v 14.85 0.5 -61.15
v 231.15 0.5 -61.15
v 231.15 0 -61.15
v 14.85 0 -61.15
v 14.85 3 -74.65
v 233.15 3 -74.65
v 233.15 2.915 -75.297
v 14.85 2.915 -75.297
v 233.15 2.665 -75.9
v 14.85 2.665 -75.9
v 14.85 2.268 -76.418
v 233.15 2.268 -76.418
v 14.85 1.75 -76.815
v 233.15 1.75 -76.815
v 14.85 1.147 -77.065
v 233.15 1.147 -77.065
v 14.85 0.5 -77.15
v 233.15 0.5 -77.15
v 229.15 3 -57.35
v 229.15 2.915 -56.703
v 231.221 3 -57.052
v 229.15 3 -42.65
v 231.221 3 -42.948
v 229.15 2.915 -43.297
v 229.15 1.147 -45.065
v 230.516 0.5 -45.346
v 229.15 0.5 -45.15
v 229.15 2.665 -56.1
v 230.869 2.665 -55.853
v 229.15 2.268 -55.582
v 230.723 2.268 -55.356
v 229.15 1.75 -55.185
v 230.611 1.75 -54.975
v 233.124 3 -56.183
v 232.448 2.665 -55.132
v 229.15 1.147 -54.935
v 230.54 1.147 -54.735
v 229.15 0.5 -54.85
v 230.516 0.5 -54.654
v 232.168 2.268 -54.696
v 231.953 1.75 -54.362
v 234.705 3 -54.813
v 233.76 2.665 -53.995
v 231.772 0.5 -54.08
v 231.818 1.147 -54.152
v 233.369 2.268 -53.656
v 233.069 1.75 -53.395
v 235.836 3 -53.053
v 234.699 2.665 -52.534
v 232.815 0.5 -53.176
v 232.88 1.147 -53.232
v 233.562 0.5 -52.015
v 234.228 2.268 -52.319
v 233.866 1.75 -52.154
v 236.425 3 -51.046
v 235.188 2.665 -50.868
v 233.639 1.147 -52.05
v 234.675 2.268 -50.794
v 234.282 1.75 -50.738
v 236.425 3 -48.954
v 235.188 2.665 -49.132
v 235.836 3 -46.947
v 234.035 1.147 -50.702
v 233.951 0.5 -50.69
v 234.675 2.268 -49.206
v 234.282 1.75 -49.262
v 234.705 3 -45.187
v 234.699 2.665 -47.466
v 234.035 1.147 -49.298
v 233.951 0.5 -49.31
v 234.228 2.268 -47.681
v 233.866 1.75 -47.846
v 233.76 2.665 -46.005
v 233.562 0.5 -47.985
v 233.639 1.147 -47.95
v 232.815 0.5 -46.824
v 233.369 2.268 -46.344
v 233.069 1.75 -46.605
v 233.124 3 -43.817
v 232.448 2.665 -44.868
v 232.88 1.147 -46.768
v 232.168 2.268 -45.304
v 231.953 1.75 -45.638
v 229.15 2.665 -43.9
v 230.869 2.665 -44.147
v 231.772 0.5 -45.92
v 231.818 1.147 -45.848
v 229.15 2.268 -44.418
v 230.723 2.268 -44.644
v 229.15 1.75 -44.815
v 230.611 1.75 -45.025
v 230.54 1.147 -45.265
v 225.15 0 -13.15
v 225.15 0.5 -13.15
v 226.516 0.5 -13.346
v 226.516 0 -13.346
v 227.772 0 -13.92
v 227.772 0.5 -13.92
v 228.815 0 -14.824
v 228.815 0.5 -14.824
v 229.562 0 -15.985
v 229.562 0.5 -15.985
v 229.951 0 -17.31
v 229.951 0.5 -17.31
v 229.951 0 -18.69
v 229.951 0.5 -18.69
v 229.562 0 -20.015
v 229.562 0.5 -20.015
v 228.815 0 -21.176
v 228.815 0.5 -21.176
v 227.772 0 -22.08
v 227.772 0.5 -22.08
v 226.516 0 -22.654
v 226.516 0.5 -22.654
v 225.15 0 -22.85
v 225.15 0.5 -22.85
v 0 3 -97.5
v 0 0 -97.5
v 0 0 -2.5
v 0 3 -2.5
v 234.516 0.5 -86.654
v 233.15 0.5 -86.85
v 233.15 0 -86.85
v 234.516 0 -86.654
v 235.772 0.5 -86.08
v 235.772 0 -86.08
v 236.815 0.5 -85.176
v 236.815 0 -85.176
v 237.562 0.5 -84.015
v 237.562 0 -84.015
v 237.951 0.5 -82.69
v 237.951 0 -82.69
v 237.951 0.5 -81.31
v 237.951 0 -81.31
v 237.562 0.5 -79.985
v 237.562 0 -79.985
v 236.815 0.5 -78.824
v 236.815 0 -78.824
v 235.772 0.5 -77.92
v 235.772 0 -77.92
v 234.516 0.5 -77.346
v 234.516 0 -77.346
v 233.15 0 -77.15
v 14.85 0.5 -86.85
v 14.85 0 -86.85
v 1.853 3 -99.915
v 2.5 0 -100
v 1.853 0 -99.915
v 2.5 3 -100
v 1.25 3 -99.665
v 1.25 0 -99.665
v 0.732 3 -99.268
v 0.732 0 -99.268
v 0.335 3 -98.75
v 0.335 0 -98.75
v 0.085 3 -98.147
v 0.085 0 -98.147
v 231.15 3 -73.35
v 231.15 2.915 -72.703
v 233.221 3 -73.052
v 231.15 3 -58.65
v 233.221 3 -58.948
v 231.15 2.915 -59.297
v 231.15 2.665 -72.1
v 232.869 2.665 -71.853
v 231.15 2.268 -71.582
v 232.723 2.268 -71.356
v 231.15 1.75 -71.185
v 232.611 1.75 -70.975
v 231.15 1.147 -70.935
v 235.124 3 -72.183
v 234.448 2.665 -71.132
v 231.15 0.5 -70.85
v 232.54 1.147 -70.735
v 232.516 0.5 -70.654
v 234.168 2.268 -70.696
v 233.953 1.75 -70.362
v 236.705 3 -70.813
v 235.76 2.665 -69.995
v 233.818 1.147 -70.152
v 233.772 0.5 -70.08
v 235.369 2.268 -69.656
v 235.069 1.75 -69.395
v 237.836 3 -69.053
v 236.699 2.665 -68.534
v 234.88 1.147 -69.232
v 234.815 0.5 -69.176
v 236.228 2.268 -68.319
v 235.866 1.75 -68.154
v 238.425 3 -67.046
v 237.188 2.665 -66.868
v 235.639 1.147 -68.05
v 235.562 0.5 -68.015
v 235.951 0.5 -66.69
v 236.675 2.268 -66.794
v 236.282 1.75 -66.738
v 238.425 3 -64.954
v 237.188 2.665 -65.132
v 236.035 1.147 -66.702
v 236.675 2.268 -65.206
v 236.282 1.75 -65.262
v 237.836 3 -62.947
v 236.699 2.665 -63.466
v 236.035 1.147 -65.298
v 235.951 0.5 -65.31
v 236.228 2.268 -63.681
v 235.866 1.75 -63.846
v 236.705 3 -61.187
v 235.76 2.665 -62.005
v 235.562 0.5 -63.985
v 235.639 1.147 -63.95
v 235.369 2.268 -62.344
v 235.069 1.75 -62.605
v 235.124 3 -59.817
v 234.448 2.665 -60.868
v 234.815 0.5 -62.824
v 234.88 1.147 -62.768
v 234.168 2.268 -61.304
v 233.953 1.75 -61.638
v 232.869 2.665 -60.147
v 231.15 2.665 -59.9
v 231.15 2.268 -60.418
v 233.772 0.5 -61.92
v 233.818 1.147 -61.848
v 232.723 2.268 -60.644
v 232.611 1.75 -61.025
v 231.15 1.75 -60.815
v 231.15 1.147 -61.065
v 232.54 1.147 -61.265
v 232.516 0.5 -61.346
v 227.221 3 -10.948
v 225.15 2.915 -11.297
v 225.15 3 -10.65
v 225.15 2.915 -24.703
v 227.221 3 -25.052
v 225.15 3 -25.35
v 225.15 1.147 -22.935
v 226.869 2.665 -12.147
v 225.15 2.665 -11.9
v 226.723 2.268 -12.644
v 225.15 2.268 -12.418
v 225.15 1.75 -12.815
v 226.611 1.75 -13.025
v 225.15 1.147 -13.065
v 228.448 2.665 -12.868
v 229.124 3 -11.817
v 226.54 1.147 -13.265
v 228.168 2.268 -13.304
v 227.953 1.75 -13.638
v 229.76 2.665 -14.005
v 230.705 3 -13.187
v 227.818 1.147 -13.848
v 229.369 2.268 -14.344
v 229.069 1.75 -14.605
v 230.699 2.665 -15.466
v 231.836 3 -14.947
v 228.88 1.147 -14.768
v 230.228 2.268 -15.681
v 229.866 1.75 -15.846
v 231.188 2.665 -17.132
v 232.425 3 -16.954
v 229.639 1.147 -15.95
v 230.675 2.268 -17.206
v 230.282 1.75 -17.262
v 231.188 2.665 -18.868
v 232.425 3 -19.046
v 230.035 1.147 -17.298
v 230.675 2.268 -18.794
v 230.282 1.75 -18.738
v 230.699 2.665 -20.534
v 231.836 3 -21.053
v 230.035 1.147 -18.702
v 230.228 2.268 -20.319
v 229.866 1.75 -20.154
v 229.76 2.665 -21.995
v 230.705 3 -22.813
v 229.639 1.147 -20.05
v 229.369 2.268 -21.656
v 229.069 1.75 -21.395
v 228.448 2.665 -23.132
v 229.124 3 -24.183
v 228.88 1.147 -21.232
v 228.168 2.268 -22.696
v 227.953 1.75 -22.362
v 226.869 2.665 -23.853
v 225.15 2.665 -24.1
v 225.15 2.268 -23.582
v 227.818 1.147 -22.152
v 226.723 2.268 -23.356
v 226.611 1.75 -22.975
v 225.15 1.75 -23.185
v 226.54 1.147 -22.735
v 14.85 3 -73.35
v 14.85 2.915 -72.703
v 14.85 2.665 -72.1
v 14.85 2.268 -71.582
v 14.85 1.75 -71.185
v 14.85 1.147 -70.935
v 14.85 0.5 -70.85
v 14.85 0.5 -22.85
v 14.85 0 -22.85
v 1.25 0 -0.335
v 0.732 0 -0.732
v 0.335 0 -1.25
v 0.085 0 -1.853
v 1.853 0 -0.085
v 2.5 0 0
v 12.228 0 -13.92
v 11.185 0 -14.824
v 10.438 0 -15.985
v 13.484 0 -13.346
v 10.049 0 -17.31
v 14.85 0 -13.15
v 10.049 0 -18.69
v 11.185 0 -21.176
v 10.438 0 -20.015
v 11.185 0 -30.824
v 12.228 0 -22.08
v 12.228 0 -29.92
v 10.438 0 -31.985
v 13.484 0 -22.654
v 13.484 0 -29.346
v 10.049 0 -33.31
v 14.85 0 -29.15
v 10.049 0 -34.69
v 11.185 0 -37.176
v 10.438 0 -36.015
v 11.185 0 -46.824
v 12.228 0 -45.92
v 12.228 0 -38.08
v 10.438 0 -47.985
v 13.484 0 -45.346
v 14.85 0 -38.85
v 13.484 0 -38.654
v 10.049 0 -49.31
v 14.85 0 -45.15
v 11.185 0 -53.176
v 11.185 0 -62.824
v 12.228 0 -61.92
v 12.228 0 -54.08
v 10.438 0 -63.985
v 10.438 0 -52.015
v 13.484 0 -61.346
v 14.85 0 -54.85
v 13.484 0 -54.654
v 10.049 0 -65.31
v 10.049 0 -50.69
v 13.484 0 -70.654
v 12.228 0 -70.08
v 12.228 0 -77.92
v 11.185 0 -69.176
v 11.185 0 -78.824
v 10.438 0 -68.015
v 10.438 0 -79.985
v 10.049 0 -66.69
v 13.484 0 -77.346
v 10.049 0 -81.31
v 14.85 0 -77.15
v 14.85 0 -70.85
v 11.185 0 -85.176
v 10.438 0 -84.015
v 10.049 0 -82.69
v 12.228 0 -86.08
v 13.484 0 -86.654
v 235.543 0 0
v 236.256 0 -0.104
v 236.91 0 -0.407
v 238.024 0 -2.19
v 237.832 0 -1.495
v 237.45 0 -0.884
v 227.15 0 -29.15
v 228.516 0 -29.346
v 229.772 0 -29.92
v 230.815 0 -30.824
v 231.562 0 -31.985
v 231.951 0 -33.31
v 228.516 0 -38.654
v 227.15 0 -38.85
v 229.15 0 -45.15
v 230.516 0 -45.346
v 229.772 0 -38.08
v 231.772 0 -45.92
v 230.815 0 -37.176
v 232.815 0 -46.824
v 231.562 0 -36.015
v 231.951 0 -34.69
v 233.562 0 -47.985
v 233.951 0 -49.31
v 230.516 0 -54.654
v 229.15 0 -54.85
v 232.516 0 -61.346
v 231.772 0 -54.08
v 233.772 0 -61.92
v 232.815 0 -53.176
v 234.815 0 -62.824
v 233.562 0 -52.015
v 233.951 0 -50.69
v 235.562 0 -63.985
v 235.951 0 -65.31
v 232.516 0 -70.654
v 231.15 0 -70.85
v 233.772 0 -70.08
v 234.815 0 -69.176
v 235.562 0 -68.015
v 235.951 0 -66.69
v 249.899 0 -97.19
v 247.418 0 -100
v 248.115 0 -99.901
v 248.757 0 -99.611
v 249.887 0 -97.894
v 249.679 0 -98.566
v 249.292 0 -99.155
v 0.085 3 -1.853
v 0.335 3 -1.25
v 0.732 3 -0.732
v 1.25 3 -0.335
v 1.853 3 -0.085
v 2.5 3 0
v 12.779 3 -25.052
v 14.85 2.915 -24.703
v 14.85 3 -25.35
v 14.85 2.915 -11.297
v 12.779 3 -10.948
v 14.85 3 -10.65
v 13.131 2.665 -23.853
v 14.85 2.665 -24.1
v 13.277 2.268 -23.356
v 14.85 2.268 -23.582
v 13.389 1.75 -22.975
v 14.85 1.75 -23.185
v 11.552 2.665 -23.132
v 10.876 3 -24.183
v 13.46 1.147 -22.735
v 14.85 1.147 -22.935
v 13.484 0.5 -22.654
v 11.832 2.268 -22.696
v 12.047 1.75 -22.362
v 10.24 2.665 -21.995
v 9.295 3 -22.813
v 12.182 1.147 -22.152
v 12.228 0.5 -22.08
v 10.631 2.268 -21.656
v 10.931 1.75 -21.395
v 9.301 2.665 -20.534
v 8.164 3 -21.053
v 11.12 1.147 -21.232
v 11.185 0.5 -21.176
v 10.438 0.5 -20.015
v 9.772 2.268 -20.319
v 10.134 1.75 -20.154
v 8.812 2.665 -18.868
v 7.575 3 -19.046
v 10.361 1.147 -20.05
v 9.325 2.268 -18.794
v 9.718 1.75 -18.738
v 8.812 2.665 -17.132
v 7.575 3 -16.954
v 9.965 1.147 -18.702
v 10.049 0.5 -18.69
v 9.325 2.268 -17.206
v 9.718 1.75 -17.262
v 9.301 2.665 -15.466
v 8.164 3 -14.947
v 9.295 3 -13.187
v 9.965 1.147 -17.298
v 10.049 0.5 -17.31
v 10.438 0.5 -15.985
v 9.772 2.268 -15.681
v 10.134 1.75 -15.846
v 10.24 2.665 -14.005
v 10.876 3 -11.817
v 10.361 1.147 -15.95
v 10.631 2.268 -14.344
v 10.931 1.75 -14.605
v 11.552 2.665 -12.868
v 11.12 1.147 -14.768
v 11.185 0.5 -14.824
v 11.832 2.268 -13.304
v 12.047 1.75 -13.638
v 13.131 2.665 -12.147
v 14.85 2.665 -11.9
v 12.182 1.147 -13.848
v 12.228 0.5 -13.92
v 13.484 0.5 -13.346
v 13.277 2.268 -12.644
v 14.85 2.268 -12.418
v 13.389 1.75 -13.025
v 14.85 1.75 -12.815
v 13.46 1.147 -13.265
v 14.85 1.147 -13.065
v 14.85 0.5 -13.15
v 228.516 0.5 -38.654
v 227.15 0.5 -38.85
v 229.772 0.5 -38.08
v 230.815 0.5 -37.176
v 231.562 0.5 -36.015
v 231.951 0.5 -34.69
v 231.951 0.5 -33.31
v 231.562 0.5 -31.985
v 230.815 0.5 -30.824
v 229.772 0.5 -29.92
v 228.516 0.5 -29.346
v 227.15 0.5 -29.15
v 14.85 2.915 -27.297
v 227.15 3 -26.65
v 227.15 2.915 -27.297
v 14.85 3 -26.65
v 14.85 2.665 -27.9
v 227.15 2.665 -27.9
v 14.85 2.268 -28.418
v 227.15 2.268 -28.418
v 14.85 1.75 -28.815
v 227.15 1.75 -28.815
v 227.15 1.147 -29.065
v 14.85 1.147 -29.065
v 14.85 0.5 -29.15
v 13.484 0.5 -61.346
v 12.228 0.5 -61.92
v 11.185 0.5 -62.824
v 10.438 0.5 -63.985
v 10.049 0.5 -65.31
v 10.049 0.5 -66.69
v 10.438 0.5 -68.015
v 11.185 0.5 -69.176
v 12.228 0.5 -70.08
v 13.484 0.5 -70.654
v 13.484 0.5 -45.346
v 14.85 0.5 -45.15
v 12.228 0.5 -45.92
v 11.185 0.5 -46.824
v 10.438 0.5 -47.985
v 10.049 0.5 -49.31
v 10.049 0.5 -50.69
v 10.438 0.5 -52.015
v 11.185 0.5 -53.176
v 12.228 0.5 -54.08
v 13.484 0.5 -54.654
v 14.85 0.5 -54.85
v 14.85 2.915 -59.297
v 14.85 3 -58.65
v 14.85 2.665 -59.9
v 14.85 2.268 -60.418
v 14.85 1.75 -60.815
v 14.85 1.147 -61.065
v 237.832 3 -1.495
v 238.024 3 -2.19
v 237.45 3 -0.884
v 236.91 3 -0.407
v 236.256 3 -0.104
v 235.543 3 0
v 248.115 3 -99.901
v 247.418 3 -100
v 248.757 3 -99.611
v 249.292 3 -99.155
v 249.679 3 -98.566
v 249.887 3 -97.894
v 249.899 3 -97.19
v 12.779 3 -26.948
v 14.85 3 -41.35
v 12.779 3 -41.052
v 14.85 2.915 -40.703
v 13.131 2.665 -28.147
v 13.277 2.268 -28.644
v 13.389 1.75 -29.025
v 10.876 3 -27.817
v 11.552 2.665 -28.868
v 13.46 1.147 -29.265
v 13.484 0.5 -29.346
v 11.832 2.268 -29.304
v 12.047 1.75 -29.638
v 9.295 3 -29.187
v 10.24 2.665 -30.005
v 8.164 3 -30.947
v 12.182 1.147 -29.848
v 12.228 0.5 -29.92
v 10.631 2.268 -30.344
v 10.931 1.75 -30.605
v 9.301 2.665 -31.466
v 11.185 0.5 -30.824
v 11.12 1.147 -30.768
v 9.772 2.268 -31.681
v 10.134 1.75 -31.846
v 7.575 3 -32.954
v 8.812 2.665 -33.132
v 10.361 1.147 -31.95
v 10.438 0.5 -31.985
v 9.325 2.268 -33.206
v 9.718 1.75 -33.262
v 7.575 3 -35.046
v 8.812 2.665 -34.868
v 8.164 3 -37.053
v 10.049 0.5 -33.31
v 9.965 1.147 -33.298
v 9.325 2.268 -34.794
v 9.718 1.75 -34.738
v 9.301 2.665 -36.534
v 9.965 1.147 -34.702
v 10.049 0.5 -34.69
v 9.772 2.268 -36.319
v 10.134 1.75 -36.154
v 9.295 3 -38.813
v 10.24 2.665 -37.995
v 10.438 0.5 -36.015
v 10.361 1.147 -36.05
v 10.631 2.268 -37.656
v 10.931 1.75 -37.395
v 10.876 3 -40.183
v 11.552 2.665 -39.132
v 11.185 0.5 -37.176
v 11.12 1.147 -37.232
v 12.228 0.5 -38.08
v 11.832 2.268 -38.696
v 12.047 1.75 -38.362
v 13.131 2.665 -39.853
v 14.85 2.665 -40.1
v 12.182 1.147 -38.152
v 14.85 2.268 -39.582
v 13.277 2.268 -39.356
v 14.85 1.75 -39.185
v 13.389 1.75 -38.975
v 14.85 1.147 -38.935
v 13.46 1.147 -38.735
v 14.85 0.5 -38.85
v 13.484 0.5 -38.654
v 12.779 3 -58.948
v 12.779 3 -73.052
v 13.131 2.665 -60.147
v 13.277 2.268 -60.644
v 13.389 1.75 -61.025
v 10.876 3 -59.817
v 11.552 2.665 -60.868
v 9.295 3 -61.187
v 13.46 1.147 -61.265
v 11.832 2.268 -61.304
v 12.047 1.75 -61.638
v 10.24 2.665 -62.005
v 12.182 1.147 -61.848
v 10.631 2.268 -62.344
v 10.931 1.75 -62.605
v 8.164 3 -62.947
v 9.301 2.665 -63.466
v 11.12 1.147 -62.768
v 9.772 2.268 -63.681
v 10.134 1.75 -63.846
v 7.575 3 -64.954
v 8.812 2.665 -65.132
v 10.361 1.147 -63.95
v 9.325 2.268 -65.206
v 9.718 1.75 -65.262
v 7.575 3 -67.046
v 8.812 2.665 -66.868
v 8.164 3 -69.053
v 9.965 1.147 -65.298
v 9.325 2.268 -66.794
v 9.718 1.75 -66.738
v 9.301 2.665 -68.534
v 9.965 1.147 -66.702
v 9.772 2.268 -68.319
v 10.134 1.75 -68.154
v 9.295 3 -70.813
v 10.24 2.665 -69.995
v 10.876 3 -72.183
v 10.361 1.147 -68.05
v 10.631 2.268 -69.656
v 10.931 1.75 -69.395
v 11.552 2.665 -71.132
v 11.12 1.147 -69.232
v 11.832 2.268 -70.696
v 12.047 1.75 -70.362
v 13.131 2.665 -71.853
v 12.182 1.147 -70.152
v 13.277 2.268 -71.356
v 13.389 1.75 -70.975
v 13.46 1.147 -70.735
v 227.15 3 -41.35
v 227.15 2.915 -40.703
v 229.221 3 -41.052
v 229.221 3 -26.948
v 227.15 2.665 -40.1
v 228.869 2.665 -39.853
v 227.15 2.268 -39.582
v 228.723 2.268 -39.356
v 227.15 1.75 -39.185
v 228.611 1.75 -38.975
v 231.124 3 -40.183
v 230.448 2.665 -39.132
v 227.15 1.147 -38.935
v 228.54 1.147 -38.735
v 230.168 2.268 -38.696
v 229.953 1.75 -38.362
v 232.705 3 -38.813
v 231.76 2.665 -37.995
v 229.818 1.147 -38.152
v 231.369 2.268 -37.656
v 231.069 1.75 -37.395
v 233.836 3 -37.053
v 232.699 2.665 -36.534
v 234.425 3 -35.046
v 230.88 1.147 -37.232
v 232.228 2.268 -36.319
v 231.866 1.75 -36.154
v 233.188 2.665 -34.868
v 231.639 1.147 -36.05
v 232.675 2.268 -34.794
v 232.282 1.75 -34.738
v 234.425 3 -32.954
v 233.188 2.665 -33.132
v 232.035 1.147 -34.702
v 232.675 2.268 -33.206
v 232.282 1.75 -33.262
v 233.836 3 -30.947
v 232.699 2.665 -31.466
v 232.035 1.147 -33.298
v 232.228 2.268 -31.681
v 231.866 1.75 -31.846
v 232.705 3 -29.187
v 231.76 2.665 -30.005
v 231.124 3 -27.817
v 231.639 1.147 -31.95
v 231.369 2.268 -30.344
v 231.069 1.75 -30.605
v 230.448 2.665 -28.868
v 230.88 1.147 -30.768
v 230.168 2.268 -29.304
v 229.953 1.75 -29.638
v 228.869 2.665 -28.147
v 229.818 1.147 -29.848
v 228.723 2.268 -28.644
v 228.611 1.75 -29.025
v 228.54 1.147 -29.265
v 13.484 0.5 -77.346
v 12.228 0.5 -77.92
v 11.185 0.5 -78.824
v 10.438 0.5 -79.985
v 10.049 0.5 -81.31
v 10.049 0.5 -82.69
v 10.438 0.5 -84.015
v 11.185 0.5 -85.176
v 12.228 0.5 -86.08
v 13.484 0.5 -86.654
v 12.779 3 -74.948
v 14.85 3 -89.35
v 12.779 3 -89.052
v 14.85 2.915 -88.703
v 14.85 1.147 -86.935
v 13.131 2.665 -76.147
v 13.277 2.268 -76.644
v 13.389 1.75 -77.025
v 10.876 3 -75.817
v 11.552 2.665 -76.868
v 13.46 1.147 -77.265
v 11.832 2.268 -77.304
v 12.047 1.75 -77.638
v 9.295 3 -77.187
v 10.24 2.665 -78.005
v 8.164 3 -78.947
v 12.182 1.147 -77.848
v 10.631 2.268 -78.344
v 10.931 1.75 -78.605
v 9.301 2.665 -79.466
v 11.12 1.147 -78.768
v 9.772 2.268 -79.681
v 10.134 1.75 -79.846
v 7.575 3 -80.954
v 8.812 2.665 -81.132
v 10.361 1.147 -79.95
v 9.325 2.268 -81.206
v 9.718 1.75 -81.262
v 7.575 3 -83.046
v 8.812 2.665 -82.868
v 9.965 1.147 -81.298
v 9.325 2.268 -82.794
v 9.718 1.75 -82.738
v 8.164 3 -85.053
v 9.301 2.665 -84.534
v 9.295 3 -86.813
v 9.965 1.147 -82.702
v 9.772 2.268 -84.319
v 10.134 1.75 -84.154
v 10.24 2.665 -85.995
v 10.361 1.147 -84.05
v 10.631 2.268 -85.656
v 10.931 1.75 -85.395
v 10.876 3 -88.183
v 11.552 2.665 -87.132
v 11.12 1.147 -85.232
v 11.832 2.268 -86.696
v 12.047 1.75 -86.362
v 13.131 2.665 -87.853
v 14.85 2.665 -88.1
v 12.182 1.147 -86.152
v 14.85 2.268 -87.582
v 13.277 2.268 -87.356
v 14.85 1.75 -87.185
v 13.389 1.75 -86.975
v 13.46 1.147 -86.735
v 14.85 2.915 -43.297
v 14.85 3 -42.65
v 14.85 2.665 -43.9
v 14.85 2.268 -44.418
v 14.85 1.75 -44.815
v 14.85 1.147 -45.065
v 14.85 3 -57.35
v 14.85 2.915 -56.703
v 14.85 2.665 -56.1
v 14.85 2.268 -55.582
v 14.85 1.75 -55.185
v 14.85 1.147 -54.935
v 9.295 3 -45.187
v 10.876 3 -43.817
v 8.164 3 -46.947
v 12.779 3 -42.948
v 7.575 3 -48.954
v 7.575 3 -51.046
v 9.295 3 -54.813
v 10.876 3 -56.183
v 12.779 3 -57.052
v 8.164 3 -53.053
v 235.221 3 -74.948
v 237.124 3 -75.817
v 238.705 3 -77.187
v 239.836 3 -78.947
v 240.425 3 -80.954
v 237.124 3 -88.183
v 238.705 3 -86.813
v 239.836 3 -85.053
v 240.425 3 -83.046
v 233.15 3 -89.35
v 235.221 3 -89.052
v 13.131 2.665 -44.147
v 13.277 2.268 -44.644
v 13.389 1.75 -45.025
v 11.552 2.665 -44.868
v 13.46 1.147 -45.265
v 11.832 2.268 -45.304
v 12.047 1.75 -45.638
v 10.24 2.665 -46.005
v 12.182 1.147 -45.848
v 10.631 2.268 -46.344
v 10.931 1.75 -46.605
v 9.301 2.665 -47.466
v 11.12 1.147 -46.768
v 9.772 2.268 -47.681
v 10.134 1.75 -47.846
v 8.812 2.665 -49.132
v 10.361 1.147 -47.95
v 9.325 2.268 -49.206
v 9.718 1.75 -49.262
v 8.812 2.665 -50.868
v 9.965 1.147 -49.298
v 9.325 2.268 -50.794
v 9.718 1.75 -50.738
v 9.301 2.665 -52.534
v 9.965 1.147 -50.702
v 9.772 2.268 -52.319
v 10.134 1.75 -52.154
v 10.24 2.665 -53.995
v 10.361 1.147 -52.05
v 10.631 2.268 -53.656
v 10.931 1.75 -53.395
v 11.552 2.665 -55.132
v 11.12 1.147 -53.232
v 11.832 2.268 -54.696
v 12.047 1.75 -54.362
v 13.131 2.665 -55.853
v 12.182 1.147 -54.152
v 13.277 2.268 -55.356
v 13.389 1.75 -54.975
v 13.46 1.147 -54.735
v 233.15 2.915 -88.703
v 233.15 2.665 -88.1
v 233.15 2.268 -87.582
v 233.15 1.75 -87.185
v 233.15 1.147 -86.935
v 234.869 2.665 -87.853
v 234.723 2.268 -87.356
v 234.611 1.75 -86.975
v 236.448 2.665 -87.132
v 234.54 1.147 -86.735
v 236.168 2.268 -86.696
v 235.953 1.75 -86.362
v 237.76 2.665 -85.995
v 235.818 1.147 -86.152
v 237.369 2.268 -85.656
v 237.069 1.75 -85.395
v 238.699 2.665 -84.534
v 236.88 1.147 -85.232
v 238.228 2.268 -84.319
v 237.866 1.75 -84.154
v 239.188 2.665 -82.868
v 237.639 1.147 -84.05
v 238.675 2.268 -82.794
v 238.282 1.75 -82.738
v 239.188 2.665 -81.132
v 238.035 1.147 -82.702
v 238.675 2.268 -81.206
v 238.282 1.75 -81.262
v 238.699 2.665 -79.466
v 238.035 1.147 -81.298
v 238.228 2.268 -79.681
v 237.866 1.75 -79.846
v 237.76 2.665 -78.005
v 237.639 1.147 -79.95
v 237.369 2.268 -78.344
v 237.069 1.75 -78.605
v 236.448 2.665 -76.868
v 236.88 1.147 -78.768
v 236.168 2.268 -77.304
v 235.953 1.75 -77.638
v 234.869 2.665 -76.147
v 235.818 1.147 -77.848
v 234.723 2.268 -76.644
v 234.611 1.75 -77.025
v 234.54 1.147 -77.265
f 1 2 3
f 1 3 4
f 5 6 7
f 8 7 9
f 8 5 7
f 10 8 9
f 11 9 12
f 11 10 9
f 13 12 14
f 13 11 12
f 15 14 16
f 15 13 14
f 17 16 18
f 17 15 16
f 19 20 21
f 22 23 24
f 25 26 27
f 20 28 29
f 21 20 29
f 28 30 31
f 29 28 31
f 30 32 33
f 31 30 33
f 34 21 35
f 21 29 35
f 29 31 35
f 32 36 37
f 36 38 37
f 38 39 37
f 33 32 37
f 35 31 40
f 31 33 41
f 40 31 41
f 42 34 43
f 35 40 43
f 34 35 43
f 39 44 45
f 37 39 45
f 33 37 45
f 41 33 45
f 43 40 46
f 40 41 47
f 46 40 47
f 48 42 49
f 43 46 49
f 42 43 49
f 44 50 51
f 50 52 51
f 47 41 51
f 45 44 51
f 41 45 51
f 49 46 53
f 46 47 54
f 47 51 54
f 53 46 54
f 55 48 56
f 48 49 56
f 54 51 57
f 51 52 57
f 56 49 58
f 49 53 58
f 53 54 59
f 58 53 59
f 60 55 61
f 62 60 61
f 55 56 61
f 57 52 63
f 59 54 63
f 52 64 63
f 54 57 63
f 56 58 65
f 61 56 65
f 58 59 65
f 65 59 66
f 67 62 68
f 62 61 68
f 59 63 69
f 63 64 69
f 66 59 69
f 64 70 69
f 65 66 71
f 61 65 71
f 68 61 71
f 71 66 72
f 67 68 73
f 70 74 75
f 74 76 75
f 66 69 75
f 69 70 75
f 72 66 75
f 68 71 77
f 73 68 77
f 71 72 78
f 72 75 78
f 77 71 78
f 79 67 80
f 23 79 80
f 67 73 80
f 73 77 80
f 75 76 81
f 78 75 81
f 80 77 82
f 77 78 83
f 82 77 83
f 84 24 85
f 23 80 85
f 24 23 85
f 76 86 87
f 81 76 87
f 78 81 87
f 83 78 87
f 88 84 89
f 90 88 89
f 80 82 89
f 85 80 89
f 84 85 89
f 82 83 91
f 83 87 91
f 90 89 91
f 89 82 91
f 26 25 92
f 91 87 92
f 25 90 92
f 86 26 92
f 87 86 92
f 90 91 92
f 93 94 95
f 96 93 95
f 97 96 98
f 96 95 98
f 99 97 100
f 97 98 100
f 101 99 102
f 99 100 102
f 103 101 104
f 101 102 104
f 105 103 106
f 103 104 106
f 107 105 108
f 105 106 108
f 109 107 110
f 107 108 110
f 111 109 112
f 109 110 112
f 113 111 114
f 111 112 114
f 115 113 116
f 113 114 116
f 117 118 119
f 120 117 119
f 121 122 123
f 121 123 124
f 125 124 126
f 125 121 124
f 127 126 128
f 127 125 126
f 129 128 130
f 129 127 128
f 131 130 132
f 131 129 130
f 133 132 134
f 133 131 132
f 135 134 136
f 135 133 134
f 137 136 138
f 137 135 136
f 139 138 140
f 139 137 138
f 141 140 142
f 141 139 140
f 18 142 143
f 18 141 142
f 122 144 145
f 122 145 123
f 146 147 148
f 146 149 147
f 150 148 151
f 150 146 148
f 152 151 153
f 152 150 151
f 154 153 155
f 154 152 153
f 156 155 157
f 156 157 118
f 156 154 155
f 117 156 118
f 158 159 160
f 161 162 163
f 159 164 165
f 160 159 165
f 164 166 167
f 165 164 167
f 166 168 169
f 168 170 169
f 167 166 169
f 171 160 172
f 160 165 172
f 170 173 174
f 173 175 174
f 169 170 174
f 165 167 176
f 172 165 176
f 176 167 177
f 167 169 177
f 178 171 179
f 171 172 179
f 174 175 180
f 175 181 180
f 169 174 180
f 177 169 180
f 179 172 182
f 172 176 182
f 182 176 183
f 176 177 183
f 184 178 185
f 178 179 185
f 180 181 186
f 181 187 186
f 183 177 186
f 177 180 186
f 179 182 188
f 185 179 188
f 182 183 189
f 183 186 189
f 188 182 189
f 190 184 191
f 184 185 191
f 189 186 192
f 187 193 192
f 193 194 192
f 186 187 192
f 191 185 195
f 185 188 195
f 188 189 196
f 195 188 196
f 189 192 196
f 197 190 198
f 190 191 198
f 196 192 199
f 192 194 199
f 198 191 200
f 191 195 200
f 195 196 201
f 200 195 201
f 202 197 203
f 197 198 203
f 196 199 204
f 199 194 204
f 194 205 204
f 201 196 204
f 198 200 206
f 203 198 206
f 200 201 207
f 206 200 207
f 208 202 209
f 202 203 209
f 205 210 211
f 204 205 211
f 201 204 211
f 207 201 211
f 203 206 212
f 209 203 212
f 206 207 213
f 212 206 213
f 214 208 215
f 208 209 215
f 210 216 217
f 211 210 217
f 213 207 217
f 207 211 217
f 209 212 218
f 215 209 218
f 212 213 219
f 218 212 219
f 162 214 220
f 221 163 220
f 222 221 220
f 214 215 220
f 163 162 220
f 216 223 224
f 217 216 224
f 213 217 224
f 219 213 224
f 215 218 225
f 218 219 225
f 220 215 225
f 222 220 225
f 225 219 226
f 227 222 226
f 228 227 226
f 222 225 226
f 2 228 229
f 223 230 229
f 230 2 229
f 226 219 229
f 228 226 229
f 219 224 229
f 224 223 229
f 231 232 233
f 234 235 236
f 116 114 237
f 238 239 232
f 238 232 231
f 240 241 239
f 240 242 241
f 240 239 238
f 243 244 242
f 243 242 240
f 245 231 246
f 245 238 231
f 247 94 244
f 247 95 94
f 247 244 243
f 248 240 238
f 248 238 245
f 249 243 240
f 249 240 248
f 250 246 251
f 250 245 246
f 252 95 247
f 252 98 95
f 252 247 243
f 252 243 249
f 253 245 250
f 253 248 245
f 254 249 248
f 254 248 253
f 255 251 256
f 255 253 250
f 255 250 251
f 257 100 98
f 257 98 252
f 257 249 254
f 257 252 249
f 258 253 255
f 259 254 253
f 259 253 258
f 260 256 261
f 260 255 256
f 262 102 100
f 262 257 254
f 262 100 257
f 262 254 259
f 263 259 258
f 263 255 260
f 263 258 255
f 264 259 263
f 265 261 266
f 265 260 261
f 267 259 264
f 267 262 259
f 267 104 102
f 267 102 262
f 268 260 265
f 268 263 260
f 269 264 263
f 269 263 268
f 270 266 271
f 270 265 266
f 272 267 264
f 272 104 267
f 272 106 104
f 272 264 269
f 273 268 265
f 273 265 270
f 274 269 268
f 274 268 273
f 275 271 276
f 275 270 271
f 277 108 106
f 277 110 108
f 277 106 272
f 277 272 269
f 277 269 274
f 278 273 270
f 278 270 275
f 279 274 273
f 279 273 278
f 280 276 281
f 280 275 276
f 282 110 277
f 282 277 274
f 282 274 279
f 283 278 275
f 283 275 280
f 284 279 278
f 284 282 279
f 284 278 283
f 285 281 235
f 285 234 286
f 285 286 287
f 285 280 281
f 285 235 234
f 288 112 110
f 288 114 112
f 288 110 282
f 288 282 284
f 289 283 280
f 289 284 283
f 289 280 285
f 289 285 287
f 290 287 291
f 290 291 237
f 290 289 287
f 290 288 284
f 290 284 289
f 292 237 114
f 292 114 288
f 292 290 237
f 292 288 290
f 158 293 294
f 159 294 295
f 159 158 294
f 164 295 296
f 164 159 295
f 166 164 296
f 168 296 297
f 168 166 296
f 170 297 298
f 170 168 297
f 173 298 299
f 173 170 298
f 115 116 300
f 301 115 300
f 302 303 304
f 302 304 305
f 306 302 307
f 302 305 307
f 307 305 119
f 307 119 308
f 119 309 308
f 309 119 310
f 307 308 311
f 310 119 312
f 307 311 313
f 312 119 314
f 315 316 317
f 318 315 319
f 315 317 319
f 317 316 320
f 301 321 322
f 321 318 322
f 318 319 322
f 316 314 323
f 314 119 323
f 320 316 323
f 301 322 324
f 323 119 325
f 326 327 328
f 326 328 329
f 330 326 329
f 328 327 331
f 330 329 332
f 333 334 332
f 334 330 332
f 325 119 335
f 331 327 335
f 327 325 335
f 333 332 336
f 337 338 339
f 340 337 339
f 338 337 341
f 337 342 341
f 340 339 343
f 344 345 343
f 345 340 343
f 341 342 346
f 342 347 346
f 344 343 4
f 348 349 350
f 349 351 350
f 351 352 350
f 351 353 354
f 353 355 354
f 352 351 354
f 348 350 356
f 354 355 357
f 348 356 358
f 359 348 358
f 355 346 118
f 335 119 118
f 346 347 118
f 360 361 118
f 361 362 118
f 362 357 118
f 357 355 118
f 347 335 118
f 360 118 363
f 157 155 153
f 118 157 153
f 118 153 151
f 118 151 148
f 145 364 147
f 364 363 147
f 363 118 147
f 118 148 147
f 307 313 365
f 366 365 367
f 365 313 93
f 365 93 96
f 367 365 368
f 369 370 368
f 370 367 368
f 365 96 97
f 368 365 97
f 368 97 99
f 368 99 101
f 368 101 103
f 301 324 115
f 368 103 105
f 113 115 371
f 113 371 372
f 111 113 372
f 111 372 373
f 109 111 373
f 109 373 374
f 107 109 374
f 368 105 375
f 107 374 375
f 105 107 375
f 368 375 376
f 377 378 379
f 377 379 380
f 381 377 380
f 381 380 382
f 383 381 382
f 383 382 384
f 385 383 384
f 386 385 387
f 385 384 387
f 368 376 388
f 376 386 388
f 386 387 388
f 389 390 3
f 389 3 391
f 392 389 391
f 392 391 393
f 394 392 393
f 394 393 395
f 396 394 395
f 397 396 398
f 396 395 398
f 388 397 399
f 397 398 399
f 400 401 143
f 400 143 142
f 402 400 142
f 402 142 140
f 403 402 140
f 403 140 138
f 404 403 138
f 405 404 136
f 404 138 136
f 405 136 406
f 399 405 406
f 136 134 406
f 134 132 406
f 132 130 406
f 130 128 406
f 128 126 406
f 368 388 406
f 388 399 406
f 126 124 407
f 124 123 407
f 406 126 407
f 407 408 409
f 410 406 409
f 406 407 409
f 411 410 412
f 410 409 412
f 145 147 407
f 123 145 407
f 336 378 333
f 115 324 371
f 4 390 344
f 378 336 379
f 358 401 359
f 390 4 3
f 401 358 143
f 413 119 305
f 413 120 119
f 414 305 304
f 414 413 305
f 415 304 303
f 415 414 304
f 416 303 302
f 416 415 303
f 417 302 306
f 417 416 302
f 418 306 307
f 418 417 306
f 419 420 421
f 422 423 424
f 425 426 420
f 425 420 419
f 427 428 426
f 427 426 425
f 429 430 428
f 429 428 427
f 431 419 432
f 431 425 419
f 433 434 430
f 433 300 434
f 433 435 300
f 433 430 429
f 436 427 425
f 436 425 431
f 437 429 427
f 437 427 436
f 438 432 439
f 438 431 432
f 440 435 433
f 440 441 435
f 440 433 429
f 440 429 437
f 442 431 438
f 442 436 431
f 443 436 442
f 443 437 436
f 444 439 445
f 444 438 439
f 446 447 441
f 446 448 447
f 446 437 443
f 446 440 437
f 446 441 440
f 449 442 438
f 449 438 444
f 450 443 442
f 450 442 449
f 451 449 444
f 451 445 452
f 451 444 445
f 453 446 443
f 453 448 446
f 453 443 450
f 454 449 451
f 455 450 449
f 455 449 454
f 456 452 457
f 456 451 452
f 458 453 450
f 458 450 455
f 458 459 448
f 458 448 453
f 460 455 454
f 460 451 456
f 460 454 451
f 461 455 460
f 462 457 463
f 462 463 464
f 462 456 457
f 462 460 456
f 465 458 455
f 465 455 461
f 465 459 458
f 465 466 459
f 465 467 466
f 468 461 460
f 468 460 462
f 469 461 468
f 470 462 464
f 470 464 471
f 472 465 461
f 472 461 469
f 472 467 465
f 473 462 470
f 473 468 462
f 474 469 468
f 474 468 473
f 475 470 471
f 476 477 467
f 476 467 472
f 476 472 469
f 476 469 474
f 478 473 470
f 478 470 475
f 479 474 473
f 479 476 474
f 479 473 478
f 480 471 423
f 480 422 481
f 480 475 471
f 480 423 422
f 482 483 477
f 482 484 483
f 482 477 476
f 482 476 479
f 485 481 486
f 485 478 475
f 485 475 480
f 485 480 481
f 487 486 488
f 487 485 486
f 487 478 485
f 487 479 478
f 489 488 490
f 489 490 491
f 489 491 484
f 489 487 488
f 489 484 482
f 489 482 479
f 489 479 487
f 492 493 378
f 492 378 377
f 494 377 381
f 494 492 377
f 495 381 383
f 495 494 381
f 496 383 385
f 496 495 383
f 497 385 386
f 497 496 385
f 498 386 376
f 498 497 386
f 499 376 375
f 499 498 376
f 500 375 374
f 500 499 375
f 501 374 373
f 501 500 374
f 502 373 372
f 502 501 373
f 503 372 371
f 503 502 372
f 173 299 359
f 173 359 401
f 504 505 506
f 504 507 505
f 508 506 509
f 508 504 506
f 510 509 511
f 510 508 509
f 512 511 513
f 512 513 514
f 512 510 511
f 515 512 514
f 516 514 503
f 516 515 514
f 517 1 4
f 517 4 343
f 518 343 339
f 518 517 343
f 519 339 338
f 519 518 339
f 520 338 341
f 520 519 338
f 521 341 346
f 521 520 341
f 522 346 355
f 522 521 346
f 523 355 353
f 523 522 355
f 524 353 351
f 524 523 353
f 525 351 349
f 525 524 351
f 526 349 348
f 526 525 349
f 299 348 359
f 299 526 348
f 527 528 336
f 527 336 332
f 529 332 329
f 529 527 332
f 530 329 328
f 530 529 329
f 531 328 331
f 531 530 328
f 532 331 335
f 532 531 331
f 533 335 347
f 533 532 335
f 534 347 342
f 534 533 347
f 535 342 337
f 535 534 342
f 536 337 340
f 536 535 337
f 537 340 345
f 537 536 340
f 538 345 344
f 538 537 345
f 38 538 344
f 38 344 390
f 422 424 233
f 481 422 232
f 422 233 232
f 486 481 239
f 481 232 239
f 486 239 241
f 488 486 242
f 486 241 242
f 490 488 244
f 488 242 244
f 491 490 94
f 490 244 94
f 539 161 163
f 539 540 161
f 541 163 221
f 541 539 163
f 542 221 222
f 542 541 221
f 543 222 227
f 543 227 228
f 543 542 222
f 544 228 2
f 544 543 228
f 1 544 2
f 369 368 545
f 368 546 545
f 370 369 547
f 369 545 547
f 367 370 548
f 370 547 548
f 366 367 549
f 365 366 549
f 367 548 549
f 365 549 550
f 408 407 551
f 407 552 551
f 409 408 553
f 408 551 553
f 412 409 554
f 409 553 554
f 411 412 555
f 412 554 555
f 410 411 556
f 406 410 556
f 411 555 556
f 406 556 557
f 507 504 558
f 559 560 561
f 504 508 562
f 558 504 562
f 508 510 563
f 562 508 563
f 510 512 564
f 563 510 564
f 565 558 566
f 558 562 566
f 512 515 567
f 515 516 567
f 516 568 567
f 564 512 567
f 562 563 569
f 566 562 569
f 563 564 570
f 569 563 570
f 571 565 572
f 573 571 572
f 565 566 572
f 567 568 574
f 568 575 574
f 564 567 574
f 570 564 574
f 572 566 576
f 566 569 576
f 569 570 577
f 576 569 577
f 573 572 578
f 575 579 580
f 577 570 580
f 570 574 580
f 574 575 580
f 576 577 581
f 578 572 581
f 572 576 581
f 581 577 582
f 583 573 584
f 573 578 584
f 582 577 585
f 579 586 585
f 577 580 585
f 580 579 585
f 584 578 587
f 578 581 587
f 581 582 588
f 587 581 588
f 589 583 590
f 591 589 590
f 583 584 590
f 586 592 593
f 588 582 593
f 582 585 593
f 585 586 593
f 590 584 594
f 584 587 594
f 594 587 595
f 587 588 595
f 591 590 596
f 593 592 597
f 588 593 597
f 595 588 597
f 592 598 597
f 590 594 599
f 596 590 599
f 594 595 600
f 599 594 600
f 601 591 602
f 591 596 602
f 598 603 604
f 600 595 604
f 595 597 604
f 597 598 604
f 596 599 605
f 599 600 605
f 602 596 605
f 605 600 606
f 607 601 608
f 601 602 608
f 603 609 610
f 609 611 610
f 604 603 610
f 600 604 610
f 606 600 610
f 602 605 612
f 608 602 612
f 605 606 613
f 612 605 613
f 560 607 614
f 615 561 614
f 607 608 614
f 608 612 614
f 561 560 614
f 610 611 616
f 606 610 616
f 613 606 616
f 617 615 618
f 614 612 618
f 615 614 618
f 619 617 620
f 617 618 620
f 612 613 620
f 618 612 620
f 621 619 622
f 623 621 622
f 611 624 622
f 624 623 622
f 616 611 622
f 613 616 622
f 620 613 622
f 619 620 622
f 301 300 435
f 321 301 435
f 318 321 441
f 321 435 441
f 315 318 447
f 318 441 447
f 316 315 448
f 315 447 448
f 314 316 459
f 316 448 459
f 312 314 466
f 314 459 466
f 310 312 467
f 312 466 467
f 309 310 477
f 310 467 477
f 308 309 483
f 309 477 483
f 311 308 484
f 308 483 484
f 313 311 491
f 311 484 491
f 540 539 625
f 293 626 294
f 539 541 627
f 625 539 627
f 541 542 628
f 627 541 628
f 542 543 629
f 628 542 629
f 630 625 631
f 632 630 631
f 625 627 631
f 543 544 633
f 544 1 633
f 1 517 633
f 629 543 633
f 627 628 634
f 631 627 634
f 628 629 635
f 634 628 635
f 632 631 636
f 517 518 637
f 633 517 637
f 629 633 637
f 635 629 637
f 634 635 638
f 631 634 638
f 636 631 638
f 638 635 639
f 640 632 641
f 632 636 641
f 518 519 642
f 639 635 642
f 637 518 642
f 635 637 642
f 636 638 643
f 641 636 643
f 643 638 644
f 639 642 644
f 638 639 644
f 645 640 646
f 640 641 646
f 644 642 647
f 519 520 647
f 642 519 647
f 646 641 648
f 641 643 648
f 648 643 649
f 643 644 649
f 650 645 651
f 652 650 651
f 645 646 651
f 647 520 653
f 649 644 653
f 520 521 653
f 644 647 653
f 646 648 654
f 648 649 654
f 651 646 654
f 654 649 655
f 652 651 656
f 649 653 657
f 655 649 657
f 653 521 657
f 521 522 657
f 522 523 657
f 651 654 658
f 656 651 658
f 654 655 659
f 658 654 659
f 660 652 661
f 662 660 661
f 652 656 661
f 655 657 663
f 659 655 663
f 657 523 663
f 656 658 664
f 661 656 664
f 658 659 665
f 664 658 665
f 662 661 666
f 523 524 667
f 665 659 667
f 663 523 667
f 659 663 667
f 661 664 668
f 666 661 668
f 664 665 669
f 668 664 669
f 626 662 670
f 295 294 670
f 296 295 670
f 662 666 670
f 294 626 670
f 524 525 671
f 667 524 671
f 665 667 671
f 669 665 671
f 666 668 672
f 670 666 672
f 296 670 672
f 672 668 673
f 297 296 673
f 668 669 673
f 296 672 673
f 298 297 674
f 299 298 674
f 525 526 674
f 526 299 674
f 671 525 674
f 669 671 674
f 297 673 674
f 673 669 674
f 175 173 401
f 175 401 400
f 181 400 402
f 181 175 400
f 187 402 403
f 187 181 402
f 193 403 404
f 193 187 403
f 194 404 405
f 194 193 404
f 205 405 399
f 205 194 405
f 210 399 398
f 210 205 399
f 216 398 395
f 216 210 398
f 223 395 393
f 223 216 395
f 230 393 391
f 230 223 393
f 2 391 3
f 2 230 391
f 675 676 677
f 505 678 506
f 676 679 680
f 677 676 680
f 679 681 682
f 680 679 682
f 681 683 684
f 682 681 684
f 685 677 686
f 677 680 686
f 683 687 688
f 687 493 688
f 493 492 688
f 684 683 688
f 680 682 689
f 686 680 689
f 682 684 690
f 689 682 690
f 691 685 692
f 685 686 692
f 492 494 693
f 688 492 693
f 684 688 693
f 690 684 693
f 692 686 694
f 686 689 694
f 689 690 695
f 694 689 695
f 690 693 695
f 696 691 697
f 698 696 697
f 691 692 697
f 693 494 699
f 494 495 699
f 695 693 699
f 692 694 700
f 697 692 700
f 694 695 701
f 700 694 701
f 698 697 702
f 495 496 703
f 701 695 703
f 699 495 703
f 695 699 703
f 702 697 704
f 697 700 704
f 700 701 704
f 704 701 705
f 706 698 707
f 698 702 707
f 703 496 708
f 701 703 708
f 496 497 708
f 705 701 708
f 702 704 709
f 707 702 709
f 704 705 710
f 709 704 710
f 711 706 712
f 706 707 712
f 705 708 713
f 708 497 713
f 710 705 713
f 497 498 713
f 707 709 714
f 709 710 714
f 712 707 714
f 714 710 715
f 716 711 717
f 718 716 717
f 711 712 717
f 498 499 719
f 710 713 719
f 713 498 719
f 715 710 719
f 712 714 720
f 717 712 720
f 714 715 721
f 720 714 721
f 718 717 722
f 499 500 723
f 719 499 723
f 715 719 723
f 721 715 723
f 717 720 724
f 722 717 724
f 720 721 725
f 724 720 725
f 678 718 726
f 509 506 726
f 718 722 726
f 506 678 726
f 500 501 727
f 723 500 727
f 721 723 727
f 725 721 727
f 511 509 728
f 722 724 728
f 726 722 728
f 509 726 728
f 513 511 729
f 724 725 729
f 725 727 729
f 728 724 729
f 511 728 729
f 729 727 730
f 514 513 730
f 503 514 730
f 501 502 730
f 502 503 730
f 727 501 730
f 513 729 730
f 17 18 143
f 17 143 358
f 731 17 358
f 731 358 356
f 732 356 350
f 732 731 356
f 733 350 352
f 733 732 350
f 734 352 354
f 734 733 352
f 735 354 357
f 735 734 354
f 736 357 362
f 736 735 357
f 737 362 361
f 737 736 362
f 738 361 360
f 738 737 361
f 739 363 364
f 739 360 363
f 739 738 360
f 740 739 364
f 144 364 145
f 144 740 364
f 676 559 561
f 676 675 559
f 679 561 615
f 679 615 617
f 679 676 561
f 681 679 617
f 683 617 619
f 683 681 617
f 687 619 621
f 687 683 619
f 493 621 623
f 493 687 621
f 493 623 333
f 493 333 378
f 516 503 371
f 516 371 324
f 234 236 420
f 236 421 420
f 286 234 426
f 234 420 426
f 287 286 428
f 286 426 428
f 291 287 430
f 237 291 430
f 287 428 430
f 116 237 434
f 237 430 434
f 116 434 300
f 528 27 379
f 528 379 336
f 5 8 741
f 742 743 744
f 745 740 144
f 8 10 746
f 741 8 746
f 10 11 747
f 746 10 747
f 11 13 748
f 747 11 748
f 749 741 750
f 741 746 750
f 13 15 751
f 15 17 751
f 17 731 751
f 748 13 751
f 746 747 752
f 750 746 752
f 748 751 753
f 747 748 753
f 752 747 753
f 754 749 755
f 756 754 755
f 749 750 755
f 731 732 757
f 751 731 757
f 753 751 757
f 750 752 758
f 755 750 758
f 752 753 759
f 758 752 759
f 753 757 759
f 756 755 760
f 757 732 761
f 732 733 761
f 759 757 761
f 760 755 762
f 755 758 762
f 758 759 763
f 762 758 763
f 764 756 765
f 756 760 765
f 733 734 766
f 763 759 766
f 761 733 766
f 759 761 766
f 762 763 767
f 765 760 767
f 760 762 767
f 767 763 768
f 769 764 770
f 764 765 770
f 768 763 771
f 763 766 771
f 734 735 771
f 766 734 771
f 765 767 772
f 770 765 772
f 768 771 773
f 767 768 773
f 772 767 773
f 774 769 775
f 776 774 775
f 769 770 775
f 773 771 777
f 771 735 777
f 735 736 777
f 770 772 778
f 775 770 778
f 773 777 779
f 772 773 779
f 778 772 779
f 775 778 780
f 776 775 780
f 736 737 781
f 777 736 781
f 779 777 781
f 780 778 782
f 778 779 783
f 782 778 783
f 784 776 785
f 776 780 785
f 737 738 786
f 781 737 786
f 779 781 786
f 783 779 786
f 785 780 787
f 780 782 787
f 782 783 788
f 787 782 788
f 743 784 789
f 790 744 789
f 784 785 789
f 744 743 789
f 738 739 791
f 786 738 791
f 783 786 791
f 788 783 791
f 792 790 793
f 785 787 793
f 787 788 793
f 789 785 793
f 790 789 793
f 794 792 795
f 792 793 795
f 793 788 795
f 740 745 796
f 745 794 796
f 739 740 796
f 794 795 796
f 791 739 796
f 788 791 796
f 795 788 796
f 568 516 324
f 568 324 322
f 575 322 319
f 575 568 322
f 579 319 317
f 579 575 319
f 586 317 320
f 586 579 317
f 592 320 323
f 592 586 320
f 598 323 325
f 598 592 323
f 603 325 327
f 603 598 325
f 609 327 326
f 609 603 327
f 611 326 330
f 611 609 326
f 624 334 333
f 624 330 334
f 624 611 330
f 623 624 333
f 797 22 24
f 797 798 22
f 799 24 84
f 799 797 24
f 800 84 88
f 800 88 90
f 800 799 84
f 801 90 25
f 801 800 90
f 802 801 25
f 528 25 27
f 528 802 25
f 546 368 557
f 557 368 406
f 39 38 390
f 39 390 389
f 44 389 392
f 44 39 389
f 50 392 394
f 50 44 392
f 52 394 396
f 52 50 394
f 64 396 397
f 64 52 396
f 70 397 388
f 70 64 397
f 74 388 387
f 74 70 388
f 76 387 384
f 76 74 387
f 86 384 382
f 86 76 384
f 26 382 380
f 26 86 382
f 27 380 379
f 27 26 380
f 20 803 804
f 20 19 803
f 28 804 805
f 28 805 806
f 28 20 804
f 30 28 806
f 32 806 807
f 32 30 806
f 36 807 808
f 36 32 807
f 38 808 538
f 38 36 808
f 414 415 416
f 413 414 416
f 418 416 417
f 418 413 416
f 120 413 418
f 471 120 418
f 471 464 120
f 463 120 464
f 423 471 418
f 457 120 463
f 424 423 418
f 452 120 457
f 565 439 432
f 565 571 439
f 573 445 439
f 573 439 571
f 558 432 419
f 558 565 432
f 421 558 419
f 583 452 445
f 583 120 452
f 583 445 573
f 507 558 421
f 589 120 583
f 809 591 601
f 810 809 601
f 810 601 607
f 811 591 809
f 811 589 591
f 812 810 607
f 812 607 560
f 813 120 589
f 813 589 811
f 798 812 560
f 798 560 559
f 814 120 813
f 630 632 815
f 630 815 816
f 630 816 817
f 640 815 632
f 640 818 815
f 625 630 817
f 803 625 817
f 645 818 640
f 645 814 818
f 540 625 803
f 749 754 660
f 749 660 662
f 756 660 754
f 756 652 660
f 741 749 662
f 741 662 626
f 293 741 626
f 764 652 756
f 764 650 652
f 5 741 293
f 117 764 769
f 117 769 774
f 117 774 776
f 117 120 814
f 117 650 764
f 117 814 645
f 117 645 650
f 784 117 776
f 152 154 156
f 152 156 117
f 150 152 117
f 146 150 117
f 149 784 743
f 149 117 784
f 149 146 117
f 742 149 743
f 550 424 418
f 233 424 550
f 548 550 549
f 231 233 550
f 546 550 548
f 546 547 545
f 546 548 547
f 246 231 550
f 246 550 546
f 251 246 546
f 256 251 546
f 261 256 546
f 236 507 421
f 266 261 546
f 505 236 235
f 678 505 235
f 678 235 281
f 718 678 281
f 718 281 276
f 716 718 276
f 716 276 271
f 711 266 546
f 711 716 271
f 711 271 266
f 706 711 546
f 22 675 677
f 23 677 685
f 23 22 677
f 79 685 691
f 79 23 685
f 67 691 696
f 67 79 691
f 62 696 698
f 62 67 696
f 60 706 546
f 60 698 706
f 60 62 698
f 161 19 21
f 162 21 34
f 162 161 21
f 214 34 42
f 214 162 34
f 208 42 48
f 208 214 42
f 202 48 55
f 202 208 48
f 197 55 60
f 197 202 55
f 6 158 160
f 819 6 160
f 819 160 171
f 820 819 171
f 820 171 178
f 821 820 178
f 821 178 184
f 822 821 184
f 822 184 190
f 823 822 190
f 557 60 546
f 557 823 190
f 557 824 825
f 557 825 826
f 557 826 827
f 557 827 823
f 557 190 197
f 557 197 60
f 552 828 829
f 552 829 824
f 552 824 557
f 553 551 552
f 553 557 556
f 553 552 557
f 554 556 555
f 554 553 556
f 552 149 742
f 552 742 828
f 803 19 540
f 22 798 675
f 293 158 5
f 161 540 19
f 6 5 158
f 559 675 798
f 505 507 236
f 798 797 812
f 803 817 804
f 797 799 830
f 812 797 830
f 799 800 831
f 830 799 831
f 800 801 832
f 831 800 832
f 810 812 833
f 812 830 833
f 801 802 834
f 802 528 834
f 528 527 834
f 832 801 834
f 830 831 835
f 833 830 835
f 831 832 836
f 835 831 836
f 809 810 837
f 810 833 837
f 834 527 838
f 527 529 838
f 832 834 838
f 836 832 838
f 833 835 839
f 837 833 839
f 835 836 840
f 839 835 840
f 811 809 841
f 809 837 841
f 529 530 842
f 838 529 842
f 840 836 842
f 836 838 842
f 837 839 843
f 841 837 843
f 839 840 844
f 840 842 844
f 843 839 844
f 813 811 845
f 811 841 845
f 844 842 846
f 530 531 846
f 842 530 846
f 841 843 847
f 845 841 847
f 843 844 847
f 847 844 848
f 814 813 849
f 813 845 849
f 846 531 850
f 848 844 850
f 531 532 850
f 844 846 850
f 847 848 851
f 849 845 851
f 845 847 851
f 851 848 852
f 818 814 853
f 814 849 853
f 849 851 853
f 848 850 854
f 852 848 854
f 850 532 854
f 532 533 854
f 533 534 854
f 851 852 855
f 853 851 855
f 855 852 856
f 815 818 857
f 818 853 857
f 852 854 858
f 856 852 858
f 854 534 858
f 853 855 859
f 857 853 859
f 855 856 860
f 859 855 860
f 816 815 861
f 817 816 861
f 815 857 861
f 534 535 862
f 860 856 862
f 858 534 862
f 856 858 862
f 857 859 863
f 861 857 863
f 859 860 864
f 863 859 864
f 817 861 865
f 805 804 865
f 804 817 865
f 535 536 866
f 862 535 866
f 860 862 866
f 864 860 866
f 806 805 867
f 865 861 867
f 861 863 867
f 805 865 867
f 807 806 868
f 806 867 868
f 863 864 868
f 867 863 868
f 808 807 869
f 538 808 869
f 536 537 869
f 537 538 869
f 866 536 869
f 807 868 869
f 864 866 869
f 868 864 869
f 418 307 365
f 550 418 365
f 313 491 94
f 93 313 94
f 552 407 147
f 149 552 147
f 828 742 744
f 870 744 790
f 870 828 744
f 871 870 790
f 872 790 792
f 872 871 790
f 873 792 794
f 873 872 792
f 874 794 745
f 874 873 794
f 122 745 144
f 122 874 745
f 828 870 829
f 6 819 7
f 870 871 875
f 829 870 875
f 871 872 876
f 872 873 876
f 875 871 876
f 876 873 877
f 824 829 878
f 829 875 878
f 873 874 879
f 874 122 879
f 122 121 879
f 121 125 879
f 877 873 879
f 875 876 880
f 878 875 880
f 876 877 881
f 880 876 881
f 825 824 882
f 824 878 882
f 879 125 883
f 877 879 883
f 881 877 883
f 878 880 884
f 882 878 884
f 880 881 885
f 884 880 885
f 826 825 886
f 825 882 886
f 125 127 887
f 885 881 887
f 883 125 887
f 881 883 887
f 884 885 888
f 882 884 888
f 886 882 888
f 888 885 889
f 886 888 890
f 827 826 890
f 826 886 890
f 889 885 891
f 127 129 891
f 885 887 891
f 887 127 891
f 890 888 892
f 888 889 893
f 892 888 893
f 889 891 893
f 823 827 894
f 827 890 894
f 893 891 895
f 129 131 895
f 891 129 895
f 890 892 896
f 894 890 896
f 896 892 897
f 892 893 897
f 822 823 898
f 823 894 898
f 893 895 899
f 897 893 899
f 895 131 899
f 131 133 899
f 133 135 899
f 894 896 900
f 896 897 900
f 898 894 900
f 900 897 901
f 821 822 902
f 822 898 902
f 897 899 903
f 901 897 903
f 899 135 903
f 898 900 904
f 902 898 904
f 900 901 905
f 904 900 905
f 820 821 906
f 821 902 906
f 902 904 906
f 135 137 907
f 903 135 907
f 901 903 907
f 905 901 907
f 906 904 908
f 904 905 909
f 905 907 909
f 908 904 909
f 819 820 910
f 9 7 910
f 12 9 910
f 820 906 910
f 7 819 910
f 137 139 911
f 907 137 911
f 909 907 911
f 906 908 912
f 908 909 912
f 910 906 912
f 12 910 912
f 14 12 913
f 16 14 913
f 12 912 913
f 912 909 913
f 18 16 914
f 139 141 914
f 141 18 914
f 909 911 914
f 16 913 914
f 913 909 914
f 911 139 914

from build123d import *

# Parameters (mm, degrees)
BOSS_EXTRUDE1_DEPTH = 3
CUT_EXTRUDE1_DEPTH  = 270.507073191
FILLET1_R           = 2.5
FILLET3_R           = 2.5


with BuildPart() as part:
    # Sketch11 → Boss-Extrude1 (new body)
    with BuildSketch(Plane(origin=(0, 0, 0), x_dir=(1, 0, 0), z_dir=(0, 1, 0))):
        Polygon((250.25, 100), (0, 100), (0, 0), (237.75, 0), align=None)
    extrude(amount=BOSS_EXTRUDE1_DEPTH)

    # Sketch12 → Cut-Extrude1 (cut, through all)
    with BuildSketch(Plane(origin=(0, 3, 0), x_dir=(1, 0, 0), z_dir=(0, 1, 0))):
        with BuildLine():
            Line((14.85, 38.85), (227.15, 38.85))
            ThreePointArc((227.15, 38.85), (232, 34), (227.15, 29.15))
            Line((227.15, 29.15), (14.85, 29.15))
            ThreePointArc((14.85, 29.15), (10, 34), (14.85, 38.85))
        make_face()
        with BuildLine():
            Line((14.85, 86.85), (233.15, 86.85))
            ThreePointArc((233.15, 86.85), (238, 82), (233.15, 77.15))
            Line((233.15, 77.15), (14.85, 77.15))
            ThreePointArc((14.85, 77.15), (10, 82), (14.85, 86.85))
        make_face()
        with BuildLine():
            Line((14.85, 70.85), (231.15, 70.85))
            ThreePointArc((231.15, 70.85), (236, 66), (231.15, 61.15))
            Line((231.15, 61.15), (14.85, 61.15))
            ThreePointArc((14.85, 61.15), (10, 66), (14.85, 70.85))
        make_face()
        with BuildLine():
            Line((14.85, 13.15), (225.15, 13.15))
            ThreePointArc((225.15, 13.15), (230, 18), (225.15, 22.85))
            Line((225.15, 22.85), (14.85, 22.85))
            ThreePointArc((14.85, 22.85), (10, 18), (14.85, 13.15))
        make_face()
        with BuildLine():
            Line((14.85, 54.85), (229.15, 54.85))
            ThreePointArc((229.15, 54.85), (234, 50), (229.15, 45.15))
            Line((229.15, 45.15), (14.85, 45.15))
            ThreePointArc((14.85, 45.15), (10, 50), (14.85, 54.85))
        make_face()
    extrude(amount=-CUT_EXTRUDE1_DEPTH, mode=Mode.SUBTRACT)

    # Fillet1
    fillet1_edges = [part.edges().sort_by_distance(p)[0] for p in [
        (10, 3, -50),
        (122, 3, -45.15),
        (234, 3, -50),
        (122, 3, -54.85),
        (10, 3, -18),
        (120, 3, -13.15),
        (230, 3, -18),
        (120, 3, -22.85),
        (10, 3, -66),
        (123, 3, -61.15),
        (236, 3, -66),
        (123, 3, -70.85),
        (10, 3, -82),
        (124, 3, -77.15),
        (238, 3, -82),
        (124, 3, -86.85),
        (10, 3, -34),
        (121, 3, -29.15),
        (232, 3, -34),
        (121, 3, -38.85),
    ]]
    fillet(fillet1_edges, radius=FILLET1_R)

    # Fillet3
    fillet3_edges = [part.edges().sort_by_distance(p)[0] for p in [
        (237.75, 1.5, 0),
        (0, 1.5, 0),
        (0, 1.5, -100),
        (250.25, 1.5, -100),
    ]]
    fillet(fillet3_edges, radius=FILLET3_R)


solid = part.part
